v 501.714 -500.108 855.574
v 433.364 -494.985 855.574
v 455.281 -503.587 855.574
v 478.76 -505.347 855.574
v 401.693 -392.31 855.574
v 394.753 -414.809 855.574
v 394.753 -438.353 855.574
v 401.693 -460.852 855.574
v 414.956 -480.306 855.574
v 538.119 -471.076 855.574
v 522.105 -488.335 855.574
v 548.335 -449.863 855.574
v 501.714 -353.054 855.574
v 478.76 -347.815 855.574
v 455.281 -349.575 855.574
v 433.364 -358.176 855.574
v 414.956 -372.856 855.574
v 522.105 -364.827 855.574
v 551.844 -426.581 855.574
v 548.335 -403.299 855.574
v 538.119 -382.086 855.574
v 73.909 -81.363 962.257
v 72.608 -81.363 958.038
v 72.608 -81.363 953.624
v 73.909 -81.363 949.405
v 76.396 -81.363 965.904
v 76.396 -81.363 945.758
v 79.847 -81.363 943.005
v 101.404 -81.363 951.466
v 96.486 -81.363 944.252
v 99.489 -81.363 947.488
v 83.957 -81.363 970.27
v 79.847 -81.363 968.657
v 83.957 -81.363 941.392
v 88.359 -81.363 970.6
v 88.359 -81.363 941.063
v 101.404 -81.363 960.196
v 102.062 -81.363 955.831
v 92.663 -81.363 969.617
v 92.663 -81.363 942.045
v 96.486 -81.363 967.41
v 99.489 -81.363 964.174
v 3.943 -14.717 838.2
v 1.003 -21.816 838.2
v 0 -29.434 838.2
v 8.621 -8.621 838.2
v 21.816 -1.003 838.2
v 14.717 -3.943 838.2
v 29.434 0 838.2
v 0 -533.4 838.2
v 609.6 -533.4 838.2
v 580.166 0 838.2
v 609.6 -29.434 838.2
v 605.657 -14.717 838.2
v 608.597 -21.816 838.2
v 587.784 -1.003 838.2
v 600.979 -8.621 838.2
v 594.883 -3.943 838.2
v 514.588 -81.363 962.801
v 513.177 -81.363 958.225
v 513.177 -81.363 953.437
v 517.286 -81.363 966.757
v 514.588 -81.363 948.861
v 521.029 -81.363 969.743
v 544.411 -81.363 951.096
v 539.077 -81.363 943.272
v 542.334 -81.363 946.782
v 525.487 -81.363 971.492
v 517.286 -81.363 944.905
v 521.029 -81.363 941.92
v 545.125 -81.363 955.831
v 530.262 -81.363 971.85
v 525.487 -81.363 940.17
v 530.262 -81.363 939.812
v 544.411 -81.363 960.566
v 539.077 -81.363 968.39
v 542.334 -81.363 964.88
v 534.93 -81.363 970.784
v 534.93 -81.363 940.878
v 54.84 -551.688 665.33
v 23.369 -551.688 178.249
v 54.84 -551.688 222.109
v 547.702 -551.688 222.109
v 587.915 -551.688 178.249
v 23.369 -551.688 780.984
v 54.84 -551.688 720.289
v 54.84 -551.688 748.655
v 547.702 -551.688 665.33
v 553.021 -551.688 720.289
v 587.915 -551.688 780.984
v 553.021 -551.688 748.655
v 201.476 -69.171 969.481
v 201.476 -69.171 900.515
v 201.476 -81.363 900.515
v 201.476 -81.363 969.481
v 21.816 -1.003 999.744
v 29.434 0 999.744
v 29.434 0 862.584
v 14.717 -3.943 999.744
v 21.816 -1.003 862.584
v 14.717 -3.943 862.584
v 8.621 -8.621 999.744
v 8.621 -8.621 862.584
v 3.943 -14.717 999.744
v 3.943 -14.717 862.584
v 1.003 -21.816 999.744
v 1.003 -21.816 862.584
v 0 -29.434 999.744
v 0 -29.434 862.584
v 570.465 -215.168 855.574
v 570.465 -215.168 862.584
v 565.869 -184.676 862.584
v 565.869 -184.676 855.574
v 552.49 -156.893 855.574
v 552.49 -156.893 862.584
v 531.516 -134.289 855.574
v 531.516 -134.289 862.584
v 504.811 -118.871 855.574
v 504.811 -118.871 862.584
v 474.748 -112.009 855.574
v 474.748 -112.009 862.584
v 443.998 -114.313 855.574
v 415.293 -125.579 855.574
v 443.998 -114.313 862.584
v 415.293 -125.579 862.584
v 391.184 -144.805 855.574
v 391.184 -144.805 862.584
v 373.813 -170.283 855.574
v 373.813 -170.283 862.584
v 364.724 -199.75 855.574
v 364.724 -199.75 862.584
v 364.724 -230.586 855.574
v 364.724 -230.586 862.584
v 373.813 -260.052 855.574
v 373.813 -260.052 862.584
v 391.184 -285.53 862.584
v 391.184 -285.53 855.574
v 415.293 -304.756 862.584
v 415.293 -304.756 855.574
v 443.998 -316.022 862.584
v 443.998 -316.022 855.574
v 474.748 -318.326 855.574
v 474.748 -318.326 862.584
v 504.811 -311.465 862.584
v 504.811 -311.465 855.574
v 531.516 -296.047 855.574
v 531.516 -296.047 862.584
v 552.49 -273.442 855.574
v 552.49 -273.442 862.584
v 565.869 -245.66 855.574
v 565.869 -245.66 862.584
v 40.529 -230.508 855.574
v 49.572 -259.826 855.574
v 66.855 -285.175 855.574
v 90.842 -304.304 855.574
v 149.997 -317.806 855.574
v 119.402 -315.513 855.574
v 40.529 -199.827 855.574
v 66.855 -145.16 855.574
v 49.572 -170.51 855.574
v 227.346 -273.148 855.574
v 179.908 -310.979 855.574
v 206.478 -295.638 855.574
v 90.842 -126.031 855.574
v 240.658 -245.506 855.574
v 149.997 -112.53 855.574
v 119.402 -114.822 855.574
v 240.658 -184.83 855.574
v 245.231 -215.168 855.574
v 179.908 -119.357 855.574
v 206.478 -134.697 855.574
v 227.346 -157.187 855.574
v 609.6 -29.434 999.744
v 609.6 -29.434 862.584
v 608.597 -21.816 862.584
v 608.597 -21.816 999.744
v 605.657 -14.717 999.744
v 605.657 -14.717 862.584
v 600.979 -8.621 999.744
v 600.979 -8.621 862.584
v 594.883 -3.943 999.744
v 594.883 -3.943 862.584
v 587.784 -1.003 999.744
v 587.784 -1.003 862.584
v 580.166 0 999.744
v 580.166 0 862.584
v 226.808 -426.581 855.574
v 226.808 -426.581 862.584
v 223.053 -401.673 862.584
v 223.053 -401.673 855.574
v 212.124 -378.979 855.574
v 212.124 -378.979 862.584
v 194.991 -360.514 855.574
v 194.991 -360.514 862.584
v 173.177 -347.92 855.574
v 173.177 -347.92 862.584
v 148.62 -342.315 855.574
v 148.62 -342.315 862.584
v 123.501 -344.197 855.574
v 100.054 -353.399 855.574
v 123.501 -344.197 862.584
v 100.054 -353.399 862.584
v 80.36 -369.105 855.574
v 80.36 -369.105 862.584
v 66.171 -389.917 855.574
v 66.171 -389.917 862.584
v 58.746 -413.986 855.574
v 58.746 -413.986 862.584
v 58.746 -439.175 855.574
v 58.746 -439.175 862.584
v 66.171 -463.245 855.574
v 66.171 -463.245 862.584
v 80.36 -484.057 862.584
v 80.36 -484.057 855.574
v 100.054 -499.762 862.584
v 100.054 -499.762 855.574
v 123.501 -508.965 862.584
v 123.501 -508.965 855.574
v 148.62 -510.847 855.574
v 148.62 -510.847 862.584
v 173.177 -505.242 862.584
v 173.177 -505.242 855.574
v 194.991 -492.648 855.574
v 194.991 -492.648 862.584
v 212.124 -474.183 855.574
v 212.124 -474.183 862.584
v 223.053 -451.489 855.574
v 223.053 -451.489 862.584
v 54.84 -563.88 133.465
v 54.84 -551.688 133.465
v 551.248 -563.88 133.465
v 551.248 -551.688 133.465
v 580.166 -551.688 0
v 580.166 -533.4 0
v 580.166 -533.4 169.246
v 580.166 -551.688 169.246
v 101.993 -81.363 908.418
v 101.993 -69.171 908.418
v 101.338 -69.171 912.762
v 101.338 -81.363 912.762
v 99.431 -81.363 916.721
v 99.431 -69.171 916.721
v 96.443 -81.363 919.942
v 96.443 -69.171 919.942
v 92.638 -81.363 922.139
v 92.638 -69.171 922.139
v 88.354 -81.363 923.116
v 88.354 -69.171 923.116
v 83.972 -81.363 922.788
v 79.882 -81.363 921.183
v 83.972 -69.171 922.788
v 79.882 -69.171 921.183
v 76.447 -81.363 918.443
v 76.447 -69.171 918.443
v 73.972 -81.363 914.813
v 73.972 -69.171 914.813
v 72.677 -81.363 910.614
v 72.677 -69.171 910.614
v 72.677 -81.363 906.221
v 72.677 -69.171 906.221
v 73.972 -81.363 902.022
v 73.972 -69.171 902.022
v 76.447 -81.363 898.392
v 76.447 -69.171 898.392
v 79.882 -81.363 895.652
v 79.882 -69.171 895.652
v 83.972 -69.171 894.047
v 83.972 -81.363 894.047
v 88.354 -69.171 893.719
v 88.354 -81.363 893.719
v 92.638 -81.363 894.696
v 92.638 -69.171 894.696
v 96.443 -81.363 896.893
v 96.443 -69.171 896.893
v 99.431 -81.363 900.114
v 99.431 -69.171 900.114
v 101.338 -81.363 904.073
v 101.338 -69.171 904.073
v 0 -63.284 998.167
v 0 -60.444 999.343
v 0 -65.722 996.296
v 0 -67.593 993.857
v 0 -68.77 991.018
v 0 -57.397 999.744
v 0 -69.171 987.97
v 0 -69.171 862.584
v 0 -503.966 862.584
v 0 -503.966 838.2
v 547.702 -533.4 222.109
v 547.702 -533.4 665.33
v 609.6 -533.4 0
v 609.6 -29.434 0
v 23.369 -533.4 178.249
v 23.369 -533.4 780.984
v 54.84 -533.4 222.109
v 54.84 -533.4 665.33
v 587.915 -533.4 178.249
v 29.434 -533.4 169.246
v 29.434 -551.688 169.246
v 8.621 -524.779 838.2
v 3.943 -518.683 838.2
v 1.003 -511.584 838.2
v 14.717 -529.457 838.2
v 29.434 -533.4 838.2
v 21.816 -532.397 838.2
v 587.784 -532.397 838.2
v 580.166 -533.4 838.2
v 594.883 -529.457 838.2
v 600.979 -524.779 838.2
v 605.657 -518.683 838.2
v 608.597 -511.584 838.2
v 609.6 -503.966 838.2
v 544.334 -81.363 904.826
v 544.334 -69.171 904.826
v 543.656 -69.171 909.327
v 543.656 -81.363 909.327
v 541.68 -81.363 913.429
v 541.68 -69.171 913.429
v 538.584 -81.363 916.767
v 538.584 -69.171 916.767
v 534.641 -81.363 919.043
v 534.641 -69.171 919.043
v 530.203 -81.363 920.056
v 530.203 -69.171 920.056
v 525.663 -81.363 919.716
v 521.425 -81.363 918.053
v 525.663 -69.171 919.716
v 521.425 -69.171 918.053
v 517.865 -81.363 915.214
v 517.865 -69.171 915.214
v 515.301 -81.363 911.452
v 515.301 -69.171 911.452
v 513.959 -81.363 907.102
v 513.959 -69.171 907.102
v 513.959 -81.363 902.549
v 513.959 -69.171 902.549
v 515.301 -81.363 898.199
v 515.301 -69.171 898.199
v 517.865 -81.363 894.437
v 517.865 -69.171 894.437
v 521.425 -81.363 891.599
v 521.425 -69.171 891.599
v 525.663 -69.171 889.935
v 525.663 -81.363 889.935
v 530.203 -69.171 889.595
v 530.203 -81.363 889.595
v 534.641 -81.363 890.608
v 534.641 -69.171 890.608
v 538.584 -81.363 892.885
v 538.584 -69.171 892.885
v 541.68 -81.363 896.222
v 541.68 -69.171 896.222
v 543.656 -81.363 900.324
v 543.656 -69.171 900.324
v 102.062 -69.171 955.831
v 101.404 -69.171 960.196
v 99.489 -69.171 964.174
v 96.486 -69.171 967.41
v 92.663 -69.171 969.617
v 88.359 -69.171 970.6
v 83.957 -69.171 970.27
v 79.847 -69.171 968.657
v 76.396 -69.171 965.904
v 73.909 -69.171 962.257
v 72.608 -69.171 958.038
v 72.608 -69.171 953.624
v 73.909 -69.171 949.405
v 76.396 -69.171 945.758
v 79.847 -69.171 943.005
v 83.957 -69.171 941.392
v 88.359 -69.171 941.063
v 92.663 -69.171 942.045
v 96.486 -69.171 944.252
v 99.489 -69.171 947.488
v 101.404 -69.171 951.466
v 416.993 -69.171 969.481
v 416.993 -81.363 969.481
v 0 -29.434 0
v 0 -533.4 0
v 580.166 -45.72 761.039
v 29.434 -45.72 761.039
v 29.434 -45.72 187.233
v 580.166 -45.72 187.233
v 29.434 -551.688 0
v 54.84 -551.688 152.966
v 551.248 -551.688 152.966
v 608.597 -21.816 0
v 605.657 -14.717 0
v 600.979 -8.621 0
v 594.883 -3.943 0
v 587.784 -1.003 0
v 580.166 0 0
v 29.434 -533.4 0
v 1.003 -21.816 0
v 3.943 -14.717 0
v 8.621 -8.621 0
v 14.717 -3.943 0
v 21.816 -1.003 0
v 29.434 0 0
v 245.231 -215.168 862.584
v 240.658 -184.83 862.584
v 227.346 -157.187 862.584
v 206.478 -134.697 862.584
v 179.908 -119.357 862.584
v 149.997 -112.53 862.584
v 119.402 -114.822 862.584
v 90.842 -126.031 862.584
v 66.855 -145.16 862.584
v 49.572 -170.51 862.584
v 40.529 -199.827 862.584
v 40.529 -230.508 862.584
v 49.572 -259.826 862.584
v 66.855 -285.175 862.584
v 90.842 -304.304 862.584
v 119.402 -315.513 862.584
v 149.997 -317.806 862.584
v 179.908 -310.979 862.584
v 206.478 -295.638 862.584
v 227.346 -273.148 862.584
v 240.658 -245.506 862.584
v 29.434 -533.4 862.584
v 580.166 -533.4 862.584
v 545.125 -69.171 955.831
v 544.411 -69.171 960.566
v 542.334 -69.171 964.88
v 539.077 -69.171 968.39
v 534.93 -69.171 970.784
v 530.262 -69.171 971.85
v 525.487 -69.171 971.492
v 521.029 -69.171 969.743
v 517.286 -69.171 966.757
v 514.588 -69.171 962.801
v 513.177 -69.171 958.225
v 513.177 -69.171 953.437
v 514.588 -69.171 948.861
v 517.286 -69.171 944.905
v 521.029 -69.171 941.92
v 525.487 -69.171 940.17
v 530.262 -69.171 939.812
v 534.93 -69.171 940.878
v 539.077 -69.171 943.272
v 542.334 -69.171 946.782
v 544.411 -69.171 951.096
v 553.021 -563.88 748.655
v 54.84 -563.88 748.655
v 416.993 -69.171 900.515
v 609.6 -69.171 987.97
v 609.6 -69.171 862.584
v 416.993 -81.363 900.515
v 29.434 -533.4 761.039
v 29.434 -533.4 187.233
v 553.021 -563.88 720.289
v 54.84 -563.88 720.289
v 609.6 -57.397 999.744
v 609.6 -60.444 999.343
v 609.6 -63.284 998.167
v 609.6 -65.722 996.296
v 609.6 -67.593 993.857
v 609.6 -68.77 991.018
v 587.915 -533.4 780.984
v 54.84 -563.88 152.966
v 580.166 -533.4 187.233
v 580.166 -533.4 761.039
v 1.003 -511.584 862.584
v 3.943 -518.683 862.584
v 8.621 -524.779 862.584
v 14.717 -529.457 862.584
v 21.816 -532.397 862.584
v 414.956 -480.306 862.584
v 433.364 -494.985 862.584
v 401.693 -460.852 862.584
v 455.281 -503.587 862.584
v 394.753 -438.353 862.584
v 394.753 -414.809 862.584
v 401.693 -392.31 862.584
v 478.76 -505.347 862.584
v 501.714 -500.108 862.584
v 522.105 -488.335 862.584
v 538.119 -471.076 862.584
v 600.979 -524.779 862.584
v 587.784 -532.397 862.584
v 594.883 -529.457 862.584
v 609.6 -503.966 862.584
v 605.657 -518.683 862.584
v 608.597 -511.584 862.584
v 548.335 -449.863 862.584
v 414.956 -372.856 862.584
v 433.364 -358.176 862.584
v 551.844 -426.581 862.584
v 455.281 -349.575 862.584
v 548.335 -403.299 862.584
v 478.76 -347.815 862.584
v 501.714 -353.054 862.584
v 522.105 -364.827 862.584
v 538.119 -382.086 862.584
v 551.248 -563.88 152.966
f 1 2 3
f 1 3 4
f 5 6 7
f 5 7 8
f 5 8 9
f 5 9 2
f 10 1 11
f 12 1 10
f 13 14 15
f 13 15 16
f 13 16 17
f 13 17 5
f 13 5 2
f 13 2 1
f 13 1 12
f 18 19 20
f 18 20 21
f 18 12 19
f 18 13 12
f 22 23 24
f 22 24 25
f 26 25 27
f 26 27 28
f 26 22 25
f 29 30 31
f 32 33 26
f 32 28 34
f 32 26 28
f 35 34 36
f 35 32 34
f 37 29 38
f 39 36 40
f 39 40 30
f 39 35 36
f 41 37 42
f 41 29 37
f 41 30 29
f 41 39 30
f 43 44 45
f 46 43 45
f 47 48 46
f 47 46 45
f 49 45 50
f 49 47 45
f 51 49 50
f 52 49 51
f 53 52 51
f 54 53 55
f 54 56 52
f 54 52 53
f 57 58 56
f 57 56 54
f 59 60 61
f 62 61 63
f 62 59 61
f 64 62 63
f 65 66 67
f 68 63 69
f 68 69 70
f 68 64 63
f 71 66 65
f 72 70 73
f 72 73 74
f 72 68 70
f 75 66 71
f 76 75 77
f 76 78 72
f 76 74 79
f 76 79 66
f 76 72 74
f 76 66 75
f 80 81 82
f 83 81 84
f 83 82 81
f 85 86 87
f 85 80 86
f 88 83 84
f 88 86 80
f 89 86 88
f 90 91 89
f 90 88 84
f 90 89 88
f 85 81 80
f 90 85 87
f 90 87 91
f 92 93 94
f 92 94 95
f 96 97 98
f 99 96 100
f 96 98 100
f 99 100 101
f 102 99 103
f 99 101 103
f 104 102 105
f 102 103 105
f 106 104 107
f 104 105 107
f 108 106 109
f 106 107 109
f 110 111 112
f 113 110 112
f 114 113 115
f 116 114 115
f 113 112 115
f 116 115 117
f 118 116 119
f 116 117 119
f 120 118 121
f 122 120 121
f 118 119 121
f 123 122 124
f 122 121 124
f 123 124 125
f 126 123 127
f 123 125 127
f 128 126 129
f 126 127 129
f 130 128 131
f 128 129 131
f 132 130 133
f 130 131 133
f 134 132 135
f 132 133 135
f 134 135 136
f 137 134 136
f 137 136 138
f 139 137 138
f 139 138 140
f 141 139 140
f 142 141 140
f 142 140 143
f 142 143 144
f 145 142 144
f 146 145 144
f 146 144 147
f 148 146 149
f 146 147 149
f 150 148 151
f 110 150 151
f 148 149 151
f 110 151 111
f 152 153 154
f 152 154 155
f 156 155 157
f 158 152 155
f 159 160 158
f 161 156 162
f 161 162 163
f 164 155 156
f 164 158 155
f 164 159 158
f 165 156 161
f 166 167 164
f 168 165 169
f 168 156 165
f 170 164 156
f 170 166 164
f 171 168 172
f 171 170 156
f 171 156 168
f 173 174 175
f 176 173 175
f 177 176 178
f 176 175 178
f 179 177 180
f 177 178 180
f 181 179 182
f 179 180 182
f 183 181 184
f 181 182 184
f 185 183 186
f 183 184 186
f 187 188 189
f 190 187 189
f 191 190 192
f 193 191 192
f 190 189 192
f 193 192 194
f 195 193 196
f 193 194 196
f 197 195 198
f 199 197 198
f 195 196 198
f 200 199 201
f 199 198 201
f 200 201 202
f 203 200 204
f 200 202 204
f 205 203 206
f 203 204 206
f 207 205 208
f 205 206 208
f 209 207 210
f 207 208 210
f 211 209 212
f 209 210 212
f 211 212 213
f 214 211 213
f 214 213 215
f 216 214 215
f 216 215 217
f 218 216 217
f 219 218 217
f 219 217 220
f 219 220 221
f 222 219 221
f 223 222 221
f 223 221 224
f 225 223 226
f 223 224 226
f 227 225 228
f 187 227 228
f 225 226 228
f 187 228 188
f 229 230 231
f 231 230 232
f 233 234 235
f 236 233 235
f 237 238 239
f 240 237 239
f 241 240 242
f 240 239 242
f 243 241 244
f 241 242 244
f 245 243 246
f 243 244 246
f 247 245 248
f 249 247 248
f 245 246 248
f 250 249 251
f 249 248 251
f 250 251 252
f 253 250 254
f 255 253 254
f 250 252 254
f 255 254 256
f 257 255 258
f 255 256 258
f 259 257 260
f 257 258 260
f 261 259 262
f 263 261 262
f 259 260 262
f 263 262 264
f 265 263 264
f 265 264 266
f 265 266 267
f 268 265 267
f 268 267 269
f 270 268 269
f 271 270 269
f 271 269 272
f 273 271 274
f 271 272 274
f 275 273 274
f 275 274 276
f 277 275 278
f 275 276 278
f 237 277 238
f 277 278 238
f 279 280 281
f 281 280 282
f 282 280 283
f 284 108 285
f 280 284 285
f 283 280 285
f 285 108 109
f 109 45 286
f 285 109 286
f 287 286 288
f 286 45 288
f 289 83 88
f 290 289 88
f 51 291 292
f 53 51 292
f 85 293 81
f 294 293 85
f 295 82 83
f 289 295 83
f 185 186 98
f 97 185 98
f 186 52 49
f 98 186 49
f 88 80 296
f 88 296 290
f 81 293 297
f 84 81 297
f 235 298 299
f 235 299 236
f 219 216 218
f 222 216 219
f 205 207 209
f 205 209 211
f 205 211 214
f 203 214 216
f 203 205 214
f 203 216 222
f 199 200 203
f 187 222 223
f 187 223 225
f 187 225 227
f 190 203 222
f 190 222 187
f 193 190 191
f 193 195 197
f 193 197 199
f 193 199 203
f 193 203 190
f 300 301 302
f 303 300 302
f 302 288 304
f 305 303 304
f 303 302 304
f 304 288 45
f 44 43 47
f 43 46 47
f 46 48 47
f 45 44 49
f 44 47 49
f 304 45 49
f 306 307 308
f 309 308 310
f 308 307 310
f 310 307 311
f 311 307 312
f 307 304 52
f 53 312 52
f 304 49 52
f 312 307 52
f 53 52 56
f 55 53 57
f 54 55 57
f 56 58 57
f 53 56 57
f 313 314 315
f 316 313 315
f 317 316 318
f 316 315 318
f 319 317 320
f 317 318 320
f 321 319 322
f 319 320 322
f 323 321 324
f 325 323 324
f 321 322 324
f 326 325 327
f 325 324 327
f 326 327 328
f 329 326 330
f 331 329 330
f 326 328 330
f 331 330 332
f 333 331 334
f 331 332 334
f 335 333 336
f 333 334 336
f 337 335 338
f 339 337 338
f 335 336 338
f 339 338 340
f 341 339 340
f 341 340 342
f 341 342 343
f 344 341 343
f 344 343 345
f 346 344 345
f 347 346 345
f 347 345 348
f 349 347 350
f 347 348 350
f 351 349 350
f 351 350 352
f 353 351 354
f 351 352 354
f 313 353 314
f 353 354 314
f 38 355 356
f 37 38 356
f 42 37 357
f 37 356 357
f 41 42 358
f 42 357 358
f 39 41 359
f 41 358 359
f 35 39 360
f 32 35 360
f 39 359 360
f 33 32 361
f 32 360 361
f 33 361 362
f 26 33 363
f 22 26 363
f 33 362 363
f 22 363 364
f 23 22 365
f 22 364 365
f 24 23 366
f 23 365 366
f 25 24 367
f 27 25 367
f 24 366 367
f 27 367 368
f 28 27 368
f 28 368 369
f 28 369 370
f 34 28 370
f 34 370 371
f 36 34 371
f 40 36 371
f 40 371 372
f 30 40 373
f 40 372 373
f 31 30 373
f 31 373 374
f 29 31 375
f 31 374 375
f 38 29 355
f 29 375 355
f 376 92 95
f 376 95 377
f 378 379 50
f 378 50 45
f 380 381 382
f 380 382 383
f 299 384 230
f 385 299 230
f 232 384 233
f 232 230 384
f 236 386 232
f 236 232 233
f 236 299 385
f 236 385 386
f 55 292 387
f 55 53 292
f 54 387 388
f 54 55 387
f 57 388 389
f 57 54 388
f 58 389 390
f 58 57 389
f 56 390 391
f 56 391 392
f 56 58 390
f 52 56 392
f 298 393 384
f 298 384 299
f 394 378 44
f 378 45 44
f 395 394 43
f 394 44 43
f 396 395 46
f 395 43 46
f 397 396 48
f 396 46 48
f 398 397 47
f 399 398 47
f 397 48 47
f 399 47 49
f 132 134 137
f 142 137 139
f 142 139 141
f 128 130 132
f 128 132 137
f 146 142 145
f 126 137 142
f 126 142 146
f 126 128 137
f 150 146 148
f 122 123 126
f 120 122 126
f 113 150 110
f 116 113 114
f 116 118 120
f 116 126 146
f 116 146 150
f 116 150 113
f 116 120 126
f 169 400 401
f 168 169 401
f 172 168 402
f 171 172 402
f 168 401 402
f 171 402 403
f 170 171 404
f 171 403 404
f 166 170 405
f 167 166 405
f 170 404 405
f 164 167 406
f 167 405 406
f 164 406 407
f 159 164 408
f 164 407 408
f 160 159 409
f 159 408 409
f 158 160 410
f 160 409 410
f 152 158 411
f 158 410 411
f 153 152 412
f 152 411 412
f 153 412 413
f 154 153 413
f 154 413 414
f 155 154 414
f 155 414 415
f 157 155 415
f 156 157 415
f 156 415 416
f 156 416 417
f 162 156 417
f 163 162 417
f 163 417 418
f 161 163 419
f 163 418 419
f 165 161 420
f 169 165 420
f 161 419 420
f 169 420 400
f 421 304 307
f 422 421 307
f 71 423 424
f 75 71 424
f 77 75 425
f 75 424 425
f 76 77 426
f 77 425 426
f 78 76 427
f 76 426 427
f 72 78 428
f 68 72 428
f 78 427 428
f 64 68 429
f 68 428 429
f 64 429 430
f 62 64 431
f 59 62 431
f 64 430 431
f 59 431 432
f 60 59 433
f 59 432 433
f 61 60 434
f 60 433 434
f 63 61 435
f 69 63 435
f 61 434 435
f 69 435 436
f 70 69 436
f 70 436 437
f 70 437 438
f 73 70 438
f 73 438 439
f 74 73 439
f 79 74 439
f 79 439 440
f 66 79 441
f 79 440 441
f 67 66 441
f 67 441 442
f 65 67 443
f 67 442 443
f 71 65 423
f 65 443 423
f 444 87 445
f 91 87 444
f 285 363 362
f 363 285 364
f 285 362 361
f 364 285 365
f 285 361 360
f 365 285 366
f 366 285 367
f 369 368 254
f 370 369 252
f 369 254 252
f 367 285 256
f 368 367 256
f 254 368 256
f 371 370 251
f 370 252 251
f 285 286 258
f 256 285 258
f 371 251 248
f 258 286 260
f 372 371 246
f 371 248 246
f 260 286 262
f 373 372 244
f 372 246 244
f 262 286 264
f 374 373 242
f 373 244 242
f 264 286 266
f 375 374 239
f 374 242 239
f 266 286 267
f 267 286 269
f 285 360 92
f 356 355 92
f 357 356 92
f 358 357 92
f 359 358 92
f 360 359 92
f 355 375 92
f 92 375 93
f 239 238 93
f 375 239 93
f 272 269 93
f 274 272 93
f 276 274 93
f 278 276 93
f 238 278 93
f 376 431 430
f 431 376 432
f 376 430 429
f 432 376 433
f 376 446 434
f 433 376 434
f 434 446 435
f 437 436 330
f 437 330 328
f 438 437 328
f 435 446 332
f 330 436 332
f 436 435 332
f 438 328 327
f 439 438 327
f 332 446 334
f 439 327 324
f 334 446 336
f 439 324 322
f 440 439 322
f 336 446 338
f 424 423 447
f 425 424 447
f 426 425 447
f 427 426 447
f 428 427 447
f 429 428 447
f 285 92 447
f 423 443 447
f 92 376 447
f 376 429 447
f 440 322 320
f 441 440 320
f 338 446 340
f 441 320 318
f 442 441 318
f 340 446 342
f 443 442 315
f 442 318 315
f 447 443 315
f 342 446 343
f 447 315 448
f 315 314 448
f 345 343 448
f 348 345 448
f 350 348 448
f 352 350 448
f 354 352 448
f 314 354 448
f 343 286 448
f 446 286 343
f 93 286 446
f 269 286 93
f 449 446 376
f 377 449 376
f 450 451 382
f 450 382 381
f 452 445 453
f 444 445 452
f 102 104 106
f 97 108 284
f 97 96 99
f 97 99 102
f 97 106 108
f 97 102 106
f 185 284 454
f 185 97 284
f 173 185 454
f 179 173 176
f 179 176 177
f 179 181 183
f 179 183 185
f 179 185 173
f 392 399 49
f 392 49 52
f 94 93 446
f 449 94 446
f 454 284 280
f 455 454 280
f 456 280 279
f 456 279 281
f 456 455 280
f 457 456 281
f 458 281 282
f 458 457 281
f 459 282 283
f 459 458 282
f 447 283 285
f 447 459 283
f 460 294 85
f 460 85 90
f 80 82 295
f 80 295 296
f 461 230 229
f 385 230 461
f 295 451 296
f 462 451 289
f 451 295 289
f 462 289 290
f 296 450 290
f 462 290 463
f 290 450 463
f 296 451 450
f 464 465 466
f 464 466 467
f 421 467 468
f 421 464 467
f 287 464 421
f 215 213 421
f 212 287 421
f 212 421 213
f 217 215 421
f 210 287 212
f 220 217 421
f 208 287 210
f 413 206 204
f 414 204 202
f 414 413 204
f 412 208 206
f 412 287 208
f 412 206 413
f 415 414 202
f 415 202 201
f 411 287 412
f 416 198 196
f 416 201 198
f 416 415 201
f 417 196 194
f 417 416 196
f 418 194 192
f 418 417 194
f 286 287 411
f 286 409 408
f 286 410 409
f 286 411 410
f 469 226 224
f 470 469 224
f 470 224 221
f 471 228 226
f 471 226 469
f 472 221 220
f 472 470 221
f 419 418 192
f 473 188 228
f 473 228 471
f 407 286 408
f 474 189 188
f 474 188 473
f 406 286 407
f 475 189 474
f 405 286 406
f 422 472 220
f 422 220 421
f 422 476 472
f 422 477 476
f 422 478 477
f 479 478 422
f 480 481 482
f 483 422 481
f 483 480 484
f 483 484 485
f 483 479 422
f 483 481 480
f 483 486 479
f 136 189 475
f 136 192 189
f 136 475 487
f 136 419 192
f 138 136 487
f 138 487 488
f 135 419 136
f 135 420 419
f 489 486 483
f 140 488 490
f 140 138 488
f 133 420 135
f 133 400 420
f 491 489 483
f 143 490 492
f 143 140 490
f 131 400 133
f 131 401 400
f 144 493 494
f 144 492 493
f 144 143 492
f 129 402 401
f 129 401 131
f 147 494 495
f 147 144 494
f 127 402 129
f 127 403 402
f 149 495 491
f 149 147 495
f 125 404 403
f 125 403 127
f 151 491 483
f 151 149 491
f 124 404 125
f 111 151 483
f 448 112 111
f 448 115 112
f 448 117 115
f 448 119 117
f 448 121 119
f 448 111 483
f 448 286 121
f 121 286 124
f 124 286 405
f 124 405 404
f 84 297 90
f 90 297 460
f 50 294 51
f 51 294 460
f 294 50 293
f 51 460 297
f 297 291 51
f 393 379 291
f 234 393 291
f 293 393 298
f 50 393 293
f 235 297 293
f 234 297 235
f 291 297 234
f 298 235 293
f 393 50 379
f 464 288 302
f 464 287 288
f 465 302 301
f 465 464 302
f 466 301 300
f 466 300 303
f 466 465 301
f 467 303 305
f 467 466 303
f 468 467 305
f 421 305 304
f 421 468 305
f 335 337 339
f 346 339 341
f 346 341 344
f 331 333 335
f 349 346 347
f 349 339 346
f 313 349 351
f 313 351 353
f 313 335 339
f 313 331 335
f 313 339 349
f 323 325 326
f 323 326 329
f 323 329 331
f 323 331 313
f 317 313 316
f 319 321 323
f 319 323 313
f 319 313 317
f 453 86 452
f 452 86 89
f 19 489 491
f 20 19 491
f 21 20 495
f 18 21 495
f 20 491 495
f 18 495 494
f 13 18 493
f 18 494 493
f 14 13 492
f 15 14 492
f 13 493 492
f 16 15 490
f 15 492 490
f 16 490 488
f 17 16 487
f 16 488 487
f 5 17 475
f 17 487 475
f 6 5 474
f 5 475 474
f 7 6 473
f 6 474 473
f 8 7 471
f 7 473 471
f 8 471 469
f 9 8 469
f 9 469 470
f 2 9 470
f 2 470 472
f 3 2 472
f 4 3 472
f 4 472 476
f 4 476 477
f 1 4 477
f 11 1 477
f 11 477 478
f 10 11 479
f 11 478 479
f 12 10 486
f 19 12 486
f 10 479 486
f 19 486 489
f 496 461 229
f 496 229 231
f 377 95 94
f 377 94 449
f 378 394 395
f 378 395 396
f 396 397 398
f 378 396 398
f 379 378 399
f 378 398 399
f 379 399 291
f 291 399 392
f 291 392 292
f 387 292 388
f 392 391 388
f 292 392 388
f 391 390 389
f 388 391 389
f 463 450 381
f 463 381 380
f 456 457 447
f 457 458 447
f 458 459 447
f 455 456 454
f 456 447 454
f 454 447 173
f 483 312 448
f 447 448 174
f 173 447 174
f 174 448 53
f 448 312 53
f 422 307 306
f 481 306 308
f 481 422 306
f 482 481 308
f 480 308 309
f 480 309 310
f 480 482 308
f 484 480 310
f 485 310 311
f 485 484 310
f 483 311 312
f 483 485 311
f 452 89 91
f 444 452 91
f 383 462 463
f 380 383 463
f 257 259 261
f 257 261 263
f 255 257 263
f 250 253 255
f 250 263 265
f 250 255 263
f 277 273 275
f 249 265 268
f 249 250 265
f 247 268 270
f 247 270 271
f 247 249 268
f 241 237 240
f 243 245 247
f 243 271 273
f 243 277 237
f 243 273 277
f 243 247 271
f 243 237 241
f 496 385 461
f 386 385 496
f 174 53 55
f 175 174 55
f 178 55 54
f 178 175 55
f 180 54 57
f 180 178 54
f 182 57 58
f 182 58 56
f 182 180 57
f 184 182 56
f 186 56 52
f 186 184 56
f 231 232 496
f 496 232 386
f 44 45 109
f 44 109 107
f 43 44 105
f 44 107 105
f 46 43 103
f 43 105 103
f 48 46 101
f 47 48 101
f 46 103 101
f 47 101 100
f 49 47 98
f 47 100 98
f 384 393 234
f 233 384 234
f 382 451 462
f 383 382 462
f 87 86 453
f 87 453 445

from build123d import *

# Parameters (mm, degrees)
F0_W      = 609.6
F0_H      = 533.4
F1_DEPTH  = 838.2
F2_W      = 609.6
F2_H      = 533.4
F3_DEPTH  = 24.384
F4_R      = 29.434092
F5_R      = 29.434092
F6_R      = 102.925841
F6_R_2    = 103.448078
F6_R_3    = 84.502695
F6_R_4    = 78.986746
F7_DEPTH  = 7.0104
F8_W      = 550.731816
F8_H      = 573.806033
F9_DEPTH  = 487.68
F8_H_2    = 169.245765
F10_DEPTH = 18.288
F11_W     = 564.545611
F11_H     = 602.734446
F12_DEPTH = 18.288
F13_W     = 498.180225
F13_H     = 28.366148
F14_DEPTH = 12.192
F15_W     = 492.861583
F15_H     = 443.220898
F16_DEPTH = 70.104
F17_W     = 496.407345
F17_H     = 19.501731
F18_DEPTH = 12.192
F20_DEPTH = 137.16
F21_R     = 11.773637
F22_R     = 14.809977
F22_R_2   = 14.740075
F22_W     = 215.516463
F22_H     = 68.965257
F22_R_3   = 16.063656
F22_R_4   = 15.273158
F23_DEPTH = 12.192


with BuildPart() as f1:
    # F0 (on Top) → F1 (new body)
    with BuildSketch(Plane.XY):
        with Locations((304.8, -266.7)):
            Rectangle(F0_W, F0_H)
    extrude(amount=F1_DEPTH)

    # F5
    f5_edges = [f1.edges().sort_by_distance(p)[0] for p in [
        (609.6, 0, 419.1),
        (0, 0, 419.1),
    ]]
    fillet(f5_edges, radius=F5_R)

    # F8 (on face) → F9 (cut)
    with BuildSketch(Plane.XZ.offset(533.4)):
        with Locations((304.8, 474.136419)):
            Rectangle(F8_W, F8_H)
    extrude(amount=-F9_DEPTH, mode=Mode.SUBTRACT)

    # F8 (on face) → F10 (join)
    with BuildSketch(Plane.XZ.offset(533.4)):
        with Locations((304.8, 84.622883)):
            Rectangle(F8_W, F8_H_2)
    extrude(amount=F10_DEPTH)

    # F11 (on face) → F12 (join)
    with BuildSketch(Plane.XZ.offset(533.4)):
        with Locations((305.642138, 479.616463)):
            Rectangle(F11_W, F11_H)
    extrude(amount=F12_DEPTH)

    # F13 (on face) → F14 (join)
    with BuildSketch(Plane.XZ.offset(551.688)):
        with Locations((303.930543, 734.472066)):
            Rectangle(F13_W, F13_H)
    extrude(amount=F14_DEPTH)

    # F15 (on face) → F16 (cut)
    with BuildSketch(Plane.XZ.offset(551.688)):
        with Locations((301.271222, 443.719186)):
            Rectangle(F15_W, F15_H)
    extrude(amount=-F16_DEPTH, mode=Mode.SUBTRACT)

    # F17 (on face) → F18 (join)
    with BuildSketch(Plane.XZ.offset(551.688)):
        with Locations((303.044103, 143.215425)):
            Rectangle(F17_W, F17_H)
    extrude(amount=F18_DEPTH)


with BuildPart() as f3:
    # F2 (on face) → F3 (new body)
    with BuildSketch(Plane.XY.offset(838.2)):
        with Locations((304.8, -266.7)):
            Rectangle(F2_W, F2_H)
    extrude(amount=F3_DEPTH)

    # F4
    f4_edges = [f3.edges().sort_by_distance(p)[0] for p in [
        (609.6, -533.4, 850.392),
        (0, -533.4, 850.392),
        (0, 0, 850.392),
        (609.6, 0, 850.392),
    ]]
    fillet(f4_edges, radius=F4_R)

    # F6 (on face) → F7 (cut)
    with BuildSketch(Plane.XY.offset(862.584)):
        with Locations((142.304897, -215.167657)):
            Circle(F6_R)
        with Locations((467.016995, -215.167657)):
            Circle(F6_R_2)
        with Locations((142.304897, -426.580936)):
            Circle(F6_R_3)
        with Locations((472.857147, -426.580936)):
            Circle(F6_R_4)
    extrude(amount=-F7_DEPTH, mode=Mode.SUBTRACT)

    # F19 (on face) → F20 (join)
    with BuildSketch(Plane.XY.offset(862.584)):
        with BuildLine():
            Line((580.165908, 0), (29.434092, 0))
            ThreePointArc((29.434092, 0), (8.621046, -8.621046), (0, -29.434092))
            Line((0, -29.434092), (0, -69.170699))
            Line((0, -69.170699), (609.6, -69.170699))
            Line((609.6, -69.170699), (609.6, -29.434092))
            ThreePointArc((609.6, -29.434092), (600.978954, -8.621046), (580.165908, 0))
        make_face()
    extrude(amount=F20_DEPTH)

    # F21
    f21_edges = [f3.edges().sort_by_distance(p)[0] for p in [
        (304.8, -69.170699, 999.744),
    ]]
    fillet(f21_edges, radius=F21_R)

    # F22 (on face) → F23 (join)
    with BuildSketch(Plane.XZ.offset(69.170699)):
        with Locations((87.252453, 955.83111)):
            Circle(F22_R)
        with Locations((87.252453, 908.417523)):
            Circle(F22_R_2)
        with Locations((309.234403, 934.997886)):
            Rectangle(F22_W, F22_H)
        with Locations((529.061198, 955.83111)):
            Circle(F22_R_3)
        with Locations((529.061198, 904.825568)):
            Circle(F22_R_4)
    extrude(amount=F23_DEPTH)


solid = Compound([f1.part, f3.part])
